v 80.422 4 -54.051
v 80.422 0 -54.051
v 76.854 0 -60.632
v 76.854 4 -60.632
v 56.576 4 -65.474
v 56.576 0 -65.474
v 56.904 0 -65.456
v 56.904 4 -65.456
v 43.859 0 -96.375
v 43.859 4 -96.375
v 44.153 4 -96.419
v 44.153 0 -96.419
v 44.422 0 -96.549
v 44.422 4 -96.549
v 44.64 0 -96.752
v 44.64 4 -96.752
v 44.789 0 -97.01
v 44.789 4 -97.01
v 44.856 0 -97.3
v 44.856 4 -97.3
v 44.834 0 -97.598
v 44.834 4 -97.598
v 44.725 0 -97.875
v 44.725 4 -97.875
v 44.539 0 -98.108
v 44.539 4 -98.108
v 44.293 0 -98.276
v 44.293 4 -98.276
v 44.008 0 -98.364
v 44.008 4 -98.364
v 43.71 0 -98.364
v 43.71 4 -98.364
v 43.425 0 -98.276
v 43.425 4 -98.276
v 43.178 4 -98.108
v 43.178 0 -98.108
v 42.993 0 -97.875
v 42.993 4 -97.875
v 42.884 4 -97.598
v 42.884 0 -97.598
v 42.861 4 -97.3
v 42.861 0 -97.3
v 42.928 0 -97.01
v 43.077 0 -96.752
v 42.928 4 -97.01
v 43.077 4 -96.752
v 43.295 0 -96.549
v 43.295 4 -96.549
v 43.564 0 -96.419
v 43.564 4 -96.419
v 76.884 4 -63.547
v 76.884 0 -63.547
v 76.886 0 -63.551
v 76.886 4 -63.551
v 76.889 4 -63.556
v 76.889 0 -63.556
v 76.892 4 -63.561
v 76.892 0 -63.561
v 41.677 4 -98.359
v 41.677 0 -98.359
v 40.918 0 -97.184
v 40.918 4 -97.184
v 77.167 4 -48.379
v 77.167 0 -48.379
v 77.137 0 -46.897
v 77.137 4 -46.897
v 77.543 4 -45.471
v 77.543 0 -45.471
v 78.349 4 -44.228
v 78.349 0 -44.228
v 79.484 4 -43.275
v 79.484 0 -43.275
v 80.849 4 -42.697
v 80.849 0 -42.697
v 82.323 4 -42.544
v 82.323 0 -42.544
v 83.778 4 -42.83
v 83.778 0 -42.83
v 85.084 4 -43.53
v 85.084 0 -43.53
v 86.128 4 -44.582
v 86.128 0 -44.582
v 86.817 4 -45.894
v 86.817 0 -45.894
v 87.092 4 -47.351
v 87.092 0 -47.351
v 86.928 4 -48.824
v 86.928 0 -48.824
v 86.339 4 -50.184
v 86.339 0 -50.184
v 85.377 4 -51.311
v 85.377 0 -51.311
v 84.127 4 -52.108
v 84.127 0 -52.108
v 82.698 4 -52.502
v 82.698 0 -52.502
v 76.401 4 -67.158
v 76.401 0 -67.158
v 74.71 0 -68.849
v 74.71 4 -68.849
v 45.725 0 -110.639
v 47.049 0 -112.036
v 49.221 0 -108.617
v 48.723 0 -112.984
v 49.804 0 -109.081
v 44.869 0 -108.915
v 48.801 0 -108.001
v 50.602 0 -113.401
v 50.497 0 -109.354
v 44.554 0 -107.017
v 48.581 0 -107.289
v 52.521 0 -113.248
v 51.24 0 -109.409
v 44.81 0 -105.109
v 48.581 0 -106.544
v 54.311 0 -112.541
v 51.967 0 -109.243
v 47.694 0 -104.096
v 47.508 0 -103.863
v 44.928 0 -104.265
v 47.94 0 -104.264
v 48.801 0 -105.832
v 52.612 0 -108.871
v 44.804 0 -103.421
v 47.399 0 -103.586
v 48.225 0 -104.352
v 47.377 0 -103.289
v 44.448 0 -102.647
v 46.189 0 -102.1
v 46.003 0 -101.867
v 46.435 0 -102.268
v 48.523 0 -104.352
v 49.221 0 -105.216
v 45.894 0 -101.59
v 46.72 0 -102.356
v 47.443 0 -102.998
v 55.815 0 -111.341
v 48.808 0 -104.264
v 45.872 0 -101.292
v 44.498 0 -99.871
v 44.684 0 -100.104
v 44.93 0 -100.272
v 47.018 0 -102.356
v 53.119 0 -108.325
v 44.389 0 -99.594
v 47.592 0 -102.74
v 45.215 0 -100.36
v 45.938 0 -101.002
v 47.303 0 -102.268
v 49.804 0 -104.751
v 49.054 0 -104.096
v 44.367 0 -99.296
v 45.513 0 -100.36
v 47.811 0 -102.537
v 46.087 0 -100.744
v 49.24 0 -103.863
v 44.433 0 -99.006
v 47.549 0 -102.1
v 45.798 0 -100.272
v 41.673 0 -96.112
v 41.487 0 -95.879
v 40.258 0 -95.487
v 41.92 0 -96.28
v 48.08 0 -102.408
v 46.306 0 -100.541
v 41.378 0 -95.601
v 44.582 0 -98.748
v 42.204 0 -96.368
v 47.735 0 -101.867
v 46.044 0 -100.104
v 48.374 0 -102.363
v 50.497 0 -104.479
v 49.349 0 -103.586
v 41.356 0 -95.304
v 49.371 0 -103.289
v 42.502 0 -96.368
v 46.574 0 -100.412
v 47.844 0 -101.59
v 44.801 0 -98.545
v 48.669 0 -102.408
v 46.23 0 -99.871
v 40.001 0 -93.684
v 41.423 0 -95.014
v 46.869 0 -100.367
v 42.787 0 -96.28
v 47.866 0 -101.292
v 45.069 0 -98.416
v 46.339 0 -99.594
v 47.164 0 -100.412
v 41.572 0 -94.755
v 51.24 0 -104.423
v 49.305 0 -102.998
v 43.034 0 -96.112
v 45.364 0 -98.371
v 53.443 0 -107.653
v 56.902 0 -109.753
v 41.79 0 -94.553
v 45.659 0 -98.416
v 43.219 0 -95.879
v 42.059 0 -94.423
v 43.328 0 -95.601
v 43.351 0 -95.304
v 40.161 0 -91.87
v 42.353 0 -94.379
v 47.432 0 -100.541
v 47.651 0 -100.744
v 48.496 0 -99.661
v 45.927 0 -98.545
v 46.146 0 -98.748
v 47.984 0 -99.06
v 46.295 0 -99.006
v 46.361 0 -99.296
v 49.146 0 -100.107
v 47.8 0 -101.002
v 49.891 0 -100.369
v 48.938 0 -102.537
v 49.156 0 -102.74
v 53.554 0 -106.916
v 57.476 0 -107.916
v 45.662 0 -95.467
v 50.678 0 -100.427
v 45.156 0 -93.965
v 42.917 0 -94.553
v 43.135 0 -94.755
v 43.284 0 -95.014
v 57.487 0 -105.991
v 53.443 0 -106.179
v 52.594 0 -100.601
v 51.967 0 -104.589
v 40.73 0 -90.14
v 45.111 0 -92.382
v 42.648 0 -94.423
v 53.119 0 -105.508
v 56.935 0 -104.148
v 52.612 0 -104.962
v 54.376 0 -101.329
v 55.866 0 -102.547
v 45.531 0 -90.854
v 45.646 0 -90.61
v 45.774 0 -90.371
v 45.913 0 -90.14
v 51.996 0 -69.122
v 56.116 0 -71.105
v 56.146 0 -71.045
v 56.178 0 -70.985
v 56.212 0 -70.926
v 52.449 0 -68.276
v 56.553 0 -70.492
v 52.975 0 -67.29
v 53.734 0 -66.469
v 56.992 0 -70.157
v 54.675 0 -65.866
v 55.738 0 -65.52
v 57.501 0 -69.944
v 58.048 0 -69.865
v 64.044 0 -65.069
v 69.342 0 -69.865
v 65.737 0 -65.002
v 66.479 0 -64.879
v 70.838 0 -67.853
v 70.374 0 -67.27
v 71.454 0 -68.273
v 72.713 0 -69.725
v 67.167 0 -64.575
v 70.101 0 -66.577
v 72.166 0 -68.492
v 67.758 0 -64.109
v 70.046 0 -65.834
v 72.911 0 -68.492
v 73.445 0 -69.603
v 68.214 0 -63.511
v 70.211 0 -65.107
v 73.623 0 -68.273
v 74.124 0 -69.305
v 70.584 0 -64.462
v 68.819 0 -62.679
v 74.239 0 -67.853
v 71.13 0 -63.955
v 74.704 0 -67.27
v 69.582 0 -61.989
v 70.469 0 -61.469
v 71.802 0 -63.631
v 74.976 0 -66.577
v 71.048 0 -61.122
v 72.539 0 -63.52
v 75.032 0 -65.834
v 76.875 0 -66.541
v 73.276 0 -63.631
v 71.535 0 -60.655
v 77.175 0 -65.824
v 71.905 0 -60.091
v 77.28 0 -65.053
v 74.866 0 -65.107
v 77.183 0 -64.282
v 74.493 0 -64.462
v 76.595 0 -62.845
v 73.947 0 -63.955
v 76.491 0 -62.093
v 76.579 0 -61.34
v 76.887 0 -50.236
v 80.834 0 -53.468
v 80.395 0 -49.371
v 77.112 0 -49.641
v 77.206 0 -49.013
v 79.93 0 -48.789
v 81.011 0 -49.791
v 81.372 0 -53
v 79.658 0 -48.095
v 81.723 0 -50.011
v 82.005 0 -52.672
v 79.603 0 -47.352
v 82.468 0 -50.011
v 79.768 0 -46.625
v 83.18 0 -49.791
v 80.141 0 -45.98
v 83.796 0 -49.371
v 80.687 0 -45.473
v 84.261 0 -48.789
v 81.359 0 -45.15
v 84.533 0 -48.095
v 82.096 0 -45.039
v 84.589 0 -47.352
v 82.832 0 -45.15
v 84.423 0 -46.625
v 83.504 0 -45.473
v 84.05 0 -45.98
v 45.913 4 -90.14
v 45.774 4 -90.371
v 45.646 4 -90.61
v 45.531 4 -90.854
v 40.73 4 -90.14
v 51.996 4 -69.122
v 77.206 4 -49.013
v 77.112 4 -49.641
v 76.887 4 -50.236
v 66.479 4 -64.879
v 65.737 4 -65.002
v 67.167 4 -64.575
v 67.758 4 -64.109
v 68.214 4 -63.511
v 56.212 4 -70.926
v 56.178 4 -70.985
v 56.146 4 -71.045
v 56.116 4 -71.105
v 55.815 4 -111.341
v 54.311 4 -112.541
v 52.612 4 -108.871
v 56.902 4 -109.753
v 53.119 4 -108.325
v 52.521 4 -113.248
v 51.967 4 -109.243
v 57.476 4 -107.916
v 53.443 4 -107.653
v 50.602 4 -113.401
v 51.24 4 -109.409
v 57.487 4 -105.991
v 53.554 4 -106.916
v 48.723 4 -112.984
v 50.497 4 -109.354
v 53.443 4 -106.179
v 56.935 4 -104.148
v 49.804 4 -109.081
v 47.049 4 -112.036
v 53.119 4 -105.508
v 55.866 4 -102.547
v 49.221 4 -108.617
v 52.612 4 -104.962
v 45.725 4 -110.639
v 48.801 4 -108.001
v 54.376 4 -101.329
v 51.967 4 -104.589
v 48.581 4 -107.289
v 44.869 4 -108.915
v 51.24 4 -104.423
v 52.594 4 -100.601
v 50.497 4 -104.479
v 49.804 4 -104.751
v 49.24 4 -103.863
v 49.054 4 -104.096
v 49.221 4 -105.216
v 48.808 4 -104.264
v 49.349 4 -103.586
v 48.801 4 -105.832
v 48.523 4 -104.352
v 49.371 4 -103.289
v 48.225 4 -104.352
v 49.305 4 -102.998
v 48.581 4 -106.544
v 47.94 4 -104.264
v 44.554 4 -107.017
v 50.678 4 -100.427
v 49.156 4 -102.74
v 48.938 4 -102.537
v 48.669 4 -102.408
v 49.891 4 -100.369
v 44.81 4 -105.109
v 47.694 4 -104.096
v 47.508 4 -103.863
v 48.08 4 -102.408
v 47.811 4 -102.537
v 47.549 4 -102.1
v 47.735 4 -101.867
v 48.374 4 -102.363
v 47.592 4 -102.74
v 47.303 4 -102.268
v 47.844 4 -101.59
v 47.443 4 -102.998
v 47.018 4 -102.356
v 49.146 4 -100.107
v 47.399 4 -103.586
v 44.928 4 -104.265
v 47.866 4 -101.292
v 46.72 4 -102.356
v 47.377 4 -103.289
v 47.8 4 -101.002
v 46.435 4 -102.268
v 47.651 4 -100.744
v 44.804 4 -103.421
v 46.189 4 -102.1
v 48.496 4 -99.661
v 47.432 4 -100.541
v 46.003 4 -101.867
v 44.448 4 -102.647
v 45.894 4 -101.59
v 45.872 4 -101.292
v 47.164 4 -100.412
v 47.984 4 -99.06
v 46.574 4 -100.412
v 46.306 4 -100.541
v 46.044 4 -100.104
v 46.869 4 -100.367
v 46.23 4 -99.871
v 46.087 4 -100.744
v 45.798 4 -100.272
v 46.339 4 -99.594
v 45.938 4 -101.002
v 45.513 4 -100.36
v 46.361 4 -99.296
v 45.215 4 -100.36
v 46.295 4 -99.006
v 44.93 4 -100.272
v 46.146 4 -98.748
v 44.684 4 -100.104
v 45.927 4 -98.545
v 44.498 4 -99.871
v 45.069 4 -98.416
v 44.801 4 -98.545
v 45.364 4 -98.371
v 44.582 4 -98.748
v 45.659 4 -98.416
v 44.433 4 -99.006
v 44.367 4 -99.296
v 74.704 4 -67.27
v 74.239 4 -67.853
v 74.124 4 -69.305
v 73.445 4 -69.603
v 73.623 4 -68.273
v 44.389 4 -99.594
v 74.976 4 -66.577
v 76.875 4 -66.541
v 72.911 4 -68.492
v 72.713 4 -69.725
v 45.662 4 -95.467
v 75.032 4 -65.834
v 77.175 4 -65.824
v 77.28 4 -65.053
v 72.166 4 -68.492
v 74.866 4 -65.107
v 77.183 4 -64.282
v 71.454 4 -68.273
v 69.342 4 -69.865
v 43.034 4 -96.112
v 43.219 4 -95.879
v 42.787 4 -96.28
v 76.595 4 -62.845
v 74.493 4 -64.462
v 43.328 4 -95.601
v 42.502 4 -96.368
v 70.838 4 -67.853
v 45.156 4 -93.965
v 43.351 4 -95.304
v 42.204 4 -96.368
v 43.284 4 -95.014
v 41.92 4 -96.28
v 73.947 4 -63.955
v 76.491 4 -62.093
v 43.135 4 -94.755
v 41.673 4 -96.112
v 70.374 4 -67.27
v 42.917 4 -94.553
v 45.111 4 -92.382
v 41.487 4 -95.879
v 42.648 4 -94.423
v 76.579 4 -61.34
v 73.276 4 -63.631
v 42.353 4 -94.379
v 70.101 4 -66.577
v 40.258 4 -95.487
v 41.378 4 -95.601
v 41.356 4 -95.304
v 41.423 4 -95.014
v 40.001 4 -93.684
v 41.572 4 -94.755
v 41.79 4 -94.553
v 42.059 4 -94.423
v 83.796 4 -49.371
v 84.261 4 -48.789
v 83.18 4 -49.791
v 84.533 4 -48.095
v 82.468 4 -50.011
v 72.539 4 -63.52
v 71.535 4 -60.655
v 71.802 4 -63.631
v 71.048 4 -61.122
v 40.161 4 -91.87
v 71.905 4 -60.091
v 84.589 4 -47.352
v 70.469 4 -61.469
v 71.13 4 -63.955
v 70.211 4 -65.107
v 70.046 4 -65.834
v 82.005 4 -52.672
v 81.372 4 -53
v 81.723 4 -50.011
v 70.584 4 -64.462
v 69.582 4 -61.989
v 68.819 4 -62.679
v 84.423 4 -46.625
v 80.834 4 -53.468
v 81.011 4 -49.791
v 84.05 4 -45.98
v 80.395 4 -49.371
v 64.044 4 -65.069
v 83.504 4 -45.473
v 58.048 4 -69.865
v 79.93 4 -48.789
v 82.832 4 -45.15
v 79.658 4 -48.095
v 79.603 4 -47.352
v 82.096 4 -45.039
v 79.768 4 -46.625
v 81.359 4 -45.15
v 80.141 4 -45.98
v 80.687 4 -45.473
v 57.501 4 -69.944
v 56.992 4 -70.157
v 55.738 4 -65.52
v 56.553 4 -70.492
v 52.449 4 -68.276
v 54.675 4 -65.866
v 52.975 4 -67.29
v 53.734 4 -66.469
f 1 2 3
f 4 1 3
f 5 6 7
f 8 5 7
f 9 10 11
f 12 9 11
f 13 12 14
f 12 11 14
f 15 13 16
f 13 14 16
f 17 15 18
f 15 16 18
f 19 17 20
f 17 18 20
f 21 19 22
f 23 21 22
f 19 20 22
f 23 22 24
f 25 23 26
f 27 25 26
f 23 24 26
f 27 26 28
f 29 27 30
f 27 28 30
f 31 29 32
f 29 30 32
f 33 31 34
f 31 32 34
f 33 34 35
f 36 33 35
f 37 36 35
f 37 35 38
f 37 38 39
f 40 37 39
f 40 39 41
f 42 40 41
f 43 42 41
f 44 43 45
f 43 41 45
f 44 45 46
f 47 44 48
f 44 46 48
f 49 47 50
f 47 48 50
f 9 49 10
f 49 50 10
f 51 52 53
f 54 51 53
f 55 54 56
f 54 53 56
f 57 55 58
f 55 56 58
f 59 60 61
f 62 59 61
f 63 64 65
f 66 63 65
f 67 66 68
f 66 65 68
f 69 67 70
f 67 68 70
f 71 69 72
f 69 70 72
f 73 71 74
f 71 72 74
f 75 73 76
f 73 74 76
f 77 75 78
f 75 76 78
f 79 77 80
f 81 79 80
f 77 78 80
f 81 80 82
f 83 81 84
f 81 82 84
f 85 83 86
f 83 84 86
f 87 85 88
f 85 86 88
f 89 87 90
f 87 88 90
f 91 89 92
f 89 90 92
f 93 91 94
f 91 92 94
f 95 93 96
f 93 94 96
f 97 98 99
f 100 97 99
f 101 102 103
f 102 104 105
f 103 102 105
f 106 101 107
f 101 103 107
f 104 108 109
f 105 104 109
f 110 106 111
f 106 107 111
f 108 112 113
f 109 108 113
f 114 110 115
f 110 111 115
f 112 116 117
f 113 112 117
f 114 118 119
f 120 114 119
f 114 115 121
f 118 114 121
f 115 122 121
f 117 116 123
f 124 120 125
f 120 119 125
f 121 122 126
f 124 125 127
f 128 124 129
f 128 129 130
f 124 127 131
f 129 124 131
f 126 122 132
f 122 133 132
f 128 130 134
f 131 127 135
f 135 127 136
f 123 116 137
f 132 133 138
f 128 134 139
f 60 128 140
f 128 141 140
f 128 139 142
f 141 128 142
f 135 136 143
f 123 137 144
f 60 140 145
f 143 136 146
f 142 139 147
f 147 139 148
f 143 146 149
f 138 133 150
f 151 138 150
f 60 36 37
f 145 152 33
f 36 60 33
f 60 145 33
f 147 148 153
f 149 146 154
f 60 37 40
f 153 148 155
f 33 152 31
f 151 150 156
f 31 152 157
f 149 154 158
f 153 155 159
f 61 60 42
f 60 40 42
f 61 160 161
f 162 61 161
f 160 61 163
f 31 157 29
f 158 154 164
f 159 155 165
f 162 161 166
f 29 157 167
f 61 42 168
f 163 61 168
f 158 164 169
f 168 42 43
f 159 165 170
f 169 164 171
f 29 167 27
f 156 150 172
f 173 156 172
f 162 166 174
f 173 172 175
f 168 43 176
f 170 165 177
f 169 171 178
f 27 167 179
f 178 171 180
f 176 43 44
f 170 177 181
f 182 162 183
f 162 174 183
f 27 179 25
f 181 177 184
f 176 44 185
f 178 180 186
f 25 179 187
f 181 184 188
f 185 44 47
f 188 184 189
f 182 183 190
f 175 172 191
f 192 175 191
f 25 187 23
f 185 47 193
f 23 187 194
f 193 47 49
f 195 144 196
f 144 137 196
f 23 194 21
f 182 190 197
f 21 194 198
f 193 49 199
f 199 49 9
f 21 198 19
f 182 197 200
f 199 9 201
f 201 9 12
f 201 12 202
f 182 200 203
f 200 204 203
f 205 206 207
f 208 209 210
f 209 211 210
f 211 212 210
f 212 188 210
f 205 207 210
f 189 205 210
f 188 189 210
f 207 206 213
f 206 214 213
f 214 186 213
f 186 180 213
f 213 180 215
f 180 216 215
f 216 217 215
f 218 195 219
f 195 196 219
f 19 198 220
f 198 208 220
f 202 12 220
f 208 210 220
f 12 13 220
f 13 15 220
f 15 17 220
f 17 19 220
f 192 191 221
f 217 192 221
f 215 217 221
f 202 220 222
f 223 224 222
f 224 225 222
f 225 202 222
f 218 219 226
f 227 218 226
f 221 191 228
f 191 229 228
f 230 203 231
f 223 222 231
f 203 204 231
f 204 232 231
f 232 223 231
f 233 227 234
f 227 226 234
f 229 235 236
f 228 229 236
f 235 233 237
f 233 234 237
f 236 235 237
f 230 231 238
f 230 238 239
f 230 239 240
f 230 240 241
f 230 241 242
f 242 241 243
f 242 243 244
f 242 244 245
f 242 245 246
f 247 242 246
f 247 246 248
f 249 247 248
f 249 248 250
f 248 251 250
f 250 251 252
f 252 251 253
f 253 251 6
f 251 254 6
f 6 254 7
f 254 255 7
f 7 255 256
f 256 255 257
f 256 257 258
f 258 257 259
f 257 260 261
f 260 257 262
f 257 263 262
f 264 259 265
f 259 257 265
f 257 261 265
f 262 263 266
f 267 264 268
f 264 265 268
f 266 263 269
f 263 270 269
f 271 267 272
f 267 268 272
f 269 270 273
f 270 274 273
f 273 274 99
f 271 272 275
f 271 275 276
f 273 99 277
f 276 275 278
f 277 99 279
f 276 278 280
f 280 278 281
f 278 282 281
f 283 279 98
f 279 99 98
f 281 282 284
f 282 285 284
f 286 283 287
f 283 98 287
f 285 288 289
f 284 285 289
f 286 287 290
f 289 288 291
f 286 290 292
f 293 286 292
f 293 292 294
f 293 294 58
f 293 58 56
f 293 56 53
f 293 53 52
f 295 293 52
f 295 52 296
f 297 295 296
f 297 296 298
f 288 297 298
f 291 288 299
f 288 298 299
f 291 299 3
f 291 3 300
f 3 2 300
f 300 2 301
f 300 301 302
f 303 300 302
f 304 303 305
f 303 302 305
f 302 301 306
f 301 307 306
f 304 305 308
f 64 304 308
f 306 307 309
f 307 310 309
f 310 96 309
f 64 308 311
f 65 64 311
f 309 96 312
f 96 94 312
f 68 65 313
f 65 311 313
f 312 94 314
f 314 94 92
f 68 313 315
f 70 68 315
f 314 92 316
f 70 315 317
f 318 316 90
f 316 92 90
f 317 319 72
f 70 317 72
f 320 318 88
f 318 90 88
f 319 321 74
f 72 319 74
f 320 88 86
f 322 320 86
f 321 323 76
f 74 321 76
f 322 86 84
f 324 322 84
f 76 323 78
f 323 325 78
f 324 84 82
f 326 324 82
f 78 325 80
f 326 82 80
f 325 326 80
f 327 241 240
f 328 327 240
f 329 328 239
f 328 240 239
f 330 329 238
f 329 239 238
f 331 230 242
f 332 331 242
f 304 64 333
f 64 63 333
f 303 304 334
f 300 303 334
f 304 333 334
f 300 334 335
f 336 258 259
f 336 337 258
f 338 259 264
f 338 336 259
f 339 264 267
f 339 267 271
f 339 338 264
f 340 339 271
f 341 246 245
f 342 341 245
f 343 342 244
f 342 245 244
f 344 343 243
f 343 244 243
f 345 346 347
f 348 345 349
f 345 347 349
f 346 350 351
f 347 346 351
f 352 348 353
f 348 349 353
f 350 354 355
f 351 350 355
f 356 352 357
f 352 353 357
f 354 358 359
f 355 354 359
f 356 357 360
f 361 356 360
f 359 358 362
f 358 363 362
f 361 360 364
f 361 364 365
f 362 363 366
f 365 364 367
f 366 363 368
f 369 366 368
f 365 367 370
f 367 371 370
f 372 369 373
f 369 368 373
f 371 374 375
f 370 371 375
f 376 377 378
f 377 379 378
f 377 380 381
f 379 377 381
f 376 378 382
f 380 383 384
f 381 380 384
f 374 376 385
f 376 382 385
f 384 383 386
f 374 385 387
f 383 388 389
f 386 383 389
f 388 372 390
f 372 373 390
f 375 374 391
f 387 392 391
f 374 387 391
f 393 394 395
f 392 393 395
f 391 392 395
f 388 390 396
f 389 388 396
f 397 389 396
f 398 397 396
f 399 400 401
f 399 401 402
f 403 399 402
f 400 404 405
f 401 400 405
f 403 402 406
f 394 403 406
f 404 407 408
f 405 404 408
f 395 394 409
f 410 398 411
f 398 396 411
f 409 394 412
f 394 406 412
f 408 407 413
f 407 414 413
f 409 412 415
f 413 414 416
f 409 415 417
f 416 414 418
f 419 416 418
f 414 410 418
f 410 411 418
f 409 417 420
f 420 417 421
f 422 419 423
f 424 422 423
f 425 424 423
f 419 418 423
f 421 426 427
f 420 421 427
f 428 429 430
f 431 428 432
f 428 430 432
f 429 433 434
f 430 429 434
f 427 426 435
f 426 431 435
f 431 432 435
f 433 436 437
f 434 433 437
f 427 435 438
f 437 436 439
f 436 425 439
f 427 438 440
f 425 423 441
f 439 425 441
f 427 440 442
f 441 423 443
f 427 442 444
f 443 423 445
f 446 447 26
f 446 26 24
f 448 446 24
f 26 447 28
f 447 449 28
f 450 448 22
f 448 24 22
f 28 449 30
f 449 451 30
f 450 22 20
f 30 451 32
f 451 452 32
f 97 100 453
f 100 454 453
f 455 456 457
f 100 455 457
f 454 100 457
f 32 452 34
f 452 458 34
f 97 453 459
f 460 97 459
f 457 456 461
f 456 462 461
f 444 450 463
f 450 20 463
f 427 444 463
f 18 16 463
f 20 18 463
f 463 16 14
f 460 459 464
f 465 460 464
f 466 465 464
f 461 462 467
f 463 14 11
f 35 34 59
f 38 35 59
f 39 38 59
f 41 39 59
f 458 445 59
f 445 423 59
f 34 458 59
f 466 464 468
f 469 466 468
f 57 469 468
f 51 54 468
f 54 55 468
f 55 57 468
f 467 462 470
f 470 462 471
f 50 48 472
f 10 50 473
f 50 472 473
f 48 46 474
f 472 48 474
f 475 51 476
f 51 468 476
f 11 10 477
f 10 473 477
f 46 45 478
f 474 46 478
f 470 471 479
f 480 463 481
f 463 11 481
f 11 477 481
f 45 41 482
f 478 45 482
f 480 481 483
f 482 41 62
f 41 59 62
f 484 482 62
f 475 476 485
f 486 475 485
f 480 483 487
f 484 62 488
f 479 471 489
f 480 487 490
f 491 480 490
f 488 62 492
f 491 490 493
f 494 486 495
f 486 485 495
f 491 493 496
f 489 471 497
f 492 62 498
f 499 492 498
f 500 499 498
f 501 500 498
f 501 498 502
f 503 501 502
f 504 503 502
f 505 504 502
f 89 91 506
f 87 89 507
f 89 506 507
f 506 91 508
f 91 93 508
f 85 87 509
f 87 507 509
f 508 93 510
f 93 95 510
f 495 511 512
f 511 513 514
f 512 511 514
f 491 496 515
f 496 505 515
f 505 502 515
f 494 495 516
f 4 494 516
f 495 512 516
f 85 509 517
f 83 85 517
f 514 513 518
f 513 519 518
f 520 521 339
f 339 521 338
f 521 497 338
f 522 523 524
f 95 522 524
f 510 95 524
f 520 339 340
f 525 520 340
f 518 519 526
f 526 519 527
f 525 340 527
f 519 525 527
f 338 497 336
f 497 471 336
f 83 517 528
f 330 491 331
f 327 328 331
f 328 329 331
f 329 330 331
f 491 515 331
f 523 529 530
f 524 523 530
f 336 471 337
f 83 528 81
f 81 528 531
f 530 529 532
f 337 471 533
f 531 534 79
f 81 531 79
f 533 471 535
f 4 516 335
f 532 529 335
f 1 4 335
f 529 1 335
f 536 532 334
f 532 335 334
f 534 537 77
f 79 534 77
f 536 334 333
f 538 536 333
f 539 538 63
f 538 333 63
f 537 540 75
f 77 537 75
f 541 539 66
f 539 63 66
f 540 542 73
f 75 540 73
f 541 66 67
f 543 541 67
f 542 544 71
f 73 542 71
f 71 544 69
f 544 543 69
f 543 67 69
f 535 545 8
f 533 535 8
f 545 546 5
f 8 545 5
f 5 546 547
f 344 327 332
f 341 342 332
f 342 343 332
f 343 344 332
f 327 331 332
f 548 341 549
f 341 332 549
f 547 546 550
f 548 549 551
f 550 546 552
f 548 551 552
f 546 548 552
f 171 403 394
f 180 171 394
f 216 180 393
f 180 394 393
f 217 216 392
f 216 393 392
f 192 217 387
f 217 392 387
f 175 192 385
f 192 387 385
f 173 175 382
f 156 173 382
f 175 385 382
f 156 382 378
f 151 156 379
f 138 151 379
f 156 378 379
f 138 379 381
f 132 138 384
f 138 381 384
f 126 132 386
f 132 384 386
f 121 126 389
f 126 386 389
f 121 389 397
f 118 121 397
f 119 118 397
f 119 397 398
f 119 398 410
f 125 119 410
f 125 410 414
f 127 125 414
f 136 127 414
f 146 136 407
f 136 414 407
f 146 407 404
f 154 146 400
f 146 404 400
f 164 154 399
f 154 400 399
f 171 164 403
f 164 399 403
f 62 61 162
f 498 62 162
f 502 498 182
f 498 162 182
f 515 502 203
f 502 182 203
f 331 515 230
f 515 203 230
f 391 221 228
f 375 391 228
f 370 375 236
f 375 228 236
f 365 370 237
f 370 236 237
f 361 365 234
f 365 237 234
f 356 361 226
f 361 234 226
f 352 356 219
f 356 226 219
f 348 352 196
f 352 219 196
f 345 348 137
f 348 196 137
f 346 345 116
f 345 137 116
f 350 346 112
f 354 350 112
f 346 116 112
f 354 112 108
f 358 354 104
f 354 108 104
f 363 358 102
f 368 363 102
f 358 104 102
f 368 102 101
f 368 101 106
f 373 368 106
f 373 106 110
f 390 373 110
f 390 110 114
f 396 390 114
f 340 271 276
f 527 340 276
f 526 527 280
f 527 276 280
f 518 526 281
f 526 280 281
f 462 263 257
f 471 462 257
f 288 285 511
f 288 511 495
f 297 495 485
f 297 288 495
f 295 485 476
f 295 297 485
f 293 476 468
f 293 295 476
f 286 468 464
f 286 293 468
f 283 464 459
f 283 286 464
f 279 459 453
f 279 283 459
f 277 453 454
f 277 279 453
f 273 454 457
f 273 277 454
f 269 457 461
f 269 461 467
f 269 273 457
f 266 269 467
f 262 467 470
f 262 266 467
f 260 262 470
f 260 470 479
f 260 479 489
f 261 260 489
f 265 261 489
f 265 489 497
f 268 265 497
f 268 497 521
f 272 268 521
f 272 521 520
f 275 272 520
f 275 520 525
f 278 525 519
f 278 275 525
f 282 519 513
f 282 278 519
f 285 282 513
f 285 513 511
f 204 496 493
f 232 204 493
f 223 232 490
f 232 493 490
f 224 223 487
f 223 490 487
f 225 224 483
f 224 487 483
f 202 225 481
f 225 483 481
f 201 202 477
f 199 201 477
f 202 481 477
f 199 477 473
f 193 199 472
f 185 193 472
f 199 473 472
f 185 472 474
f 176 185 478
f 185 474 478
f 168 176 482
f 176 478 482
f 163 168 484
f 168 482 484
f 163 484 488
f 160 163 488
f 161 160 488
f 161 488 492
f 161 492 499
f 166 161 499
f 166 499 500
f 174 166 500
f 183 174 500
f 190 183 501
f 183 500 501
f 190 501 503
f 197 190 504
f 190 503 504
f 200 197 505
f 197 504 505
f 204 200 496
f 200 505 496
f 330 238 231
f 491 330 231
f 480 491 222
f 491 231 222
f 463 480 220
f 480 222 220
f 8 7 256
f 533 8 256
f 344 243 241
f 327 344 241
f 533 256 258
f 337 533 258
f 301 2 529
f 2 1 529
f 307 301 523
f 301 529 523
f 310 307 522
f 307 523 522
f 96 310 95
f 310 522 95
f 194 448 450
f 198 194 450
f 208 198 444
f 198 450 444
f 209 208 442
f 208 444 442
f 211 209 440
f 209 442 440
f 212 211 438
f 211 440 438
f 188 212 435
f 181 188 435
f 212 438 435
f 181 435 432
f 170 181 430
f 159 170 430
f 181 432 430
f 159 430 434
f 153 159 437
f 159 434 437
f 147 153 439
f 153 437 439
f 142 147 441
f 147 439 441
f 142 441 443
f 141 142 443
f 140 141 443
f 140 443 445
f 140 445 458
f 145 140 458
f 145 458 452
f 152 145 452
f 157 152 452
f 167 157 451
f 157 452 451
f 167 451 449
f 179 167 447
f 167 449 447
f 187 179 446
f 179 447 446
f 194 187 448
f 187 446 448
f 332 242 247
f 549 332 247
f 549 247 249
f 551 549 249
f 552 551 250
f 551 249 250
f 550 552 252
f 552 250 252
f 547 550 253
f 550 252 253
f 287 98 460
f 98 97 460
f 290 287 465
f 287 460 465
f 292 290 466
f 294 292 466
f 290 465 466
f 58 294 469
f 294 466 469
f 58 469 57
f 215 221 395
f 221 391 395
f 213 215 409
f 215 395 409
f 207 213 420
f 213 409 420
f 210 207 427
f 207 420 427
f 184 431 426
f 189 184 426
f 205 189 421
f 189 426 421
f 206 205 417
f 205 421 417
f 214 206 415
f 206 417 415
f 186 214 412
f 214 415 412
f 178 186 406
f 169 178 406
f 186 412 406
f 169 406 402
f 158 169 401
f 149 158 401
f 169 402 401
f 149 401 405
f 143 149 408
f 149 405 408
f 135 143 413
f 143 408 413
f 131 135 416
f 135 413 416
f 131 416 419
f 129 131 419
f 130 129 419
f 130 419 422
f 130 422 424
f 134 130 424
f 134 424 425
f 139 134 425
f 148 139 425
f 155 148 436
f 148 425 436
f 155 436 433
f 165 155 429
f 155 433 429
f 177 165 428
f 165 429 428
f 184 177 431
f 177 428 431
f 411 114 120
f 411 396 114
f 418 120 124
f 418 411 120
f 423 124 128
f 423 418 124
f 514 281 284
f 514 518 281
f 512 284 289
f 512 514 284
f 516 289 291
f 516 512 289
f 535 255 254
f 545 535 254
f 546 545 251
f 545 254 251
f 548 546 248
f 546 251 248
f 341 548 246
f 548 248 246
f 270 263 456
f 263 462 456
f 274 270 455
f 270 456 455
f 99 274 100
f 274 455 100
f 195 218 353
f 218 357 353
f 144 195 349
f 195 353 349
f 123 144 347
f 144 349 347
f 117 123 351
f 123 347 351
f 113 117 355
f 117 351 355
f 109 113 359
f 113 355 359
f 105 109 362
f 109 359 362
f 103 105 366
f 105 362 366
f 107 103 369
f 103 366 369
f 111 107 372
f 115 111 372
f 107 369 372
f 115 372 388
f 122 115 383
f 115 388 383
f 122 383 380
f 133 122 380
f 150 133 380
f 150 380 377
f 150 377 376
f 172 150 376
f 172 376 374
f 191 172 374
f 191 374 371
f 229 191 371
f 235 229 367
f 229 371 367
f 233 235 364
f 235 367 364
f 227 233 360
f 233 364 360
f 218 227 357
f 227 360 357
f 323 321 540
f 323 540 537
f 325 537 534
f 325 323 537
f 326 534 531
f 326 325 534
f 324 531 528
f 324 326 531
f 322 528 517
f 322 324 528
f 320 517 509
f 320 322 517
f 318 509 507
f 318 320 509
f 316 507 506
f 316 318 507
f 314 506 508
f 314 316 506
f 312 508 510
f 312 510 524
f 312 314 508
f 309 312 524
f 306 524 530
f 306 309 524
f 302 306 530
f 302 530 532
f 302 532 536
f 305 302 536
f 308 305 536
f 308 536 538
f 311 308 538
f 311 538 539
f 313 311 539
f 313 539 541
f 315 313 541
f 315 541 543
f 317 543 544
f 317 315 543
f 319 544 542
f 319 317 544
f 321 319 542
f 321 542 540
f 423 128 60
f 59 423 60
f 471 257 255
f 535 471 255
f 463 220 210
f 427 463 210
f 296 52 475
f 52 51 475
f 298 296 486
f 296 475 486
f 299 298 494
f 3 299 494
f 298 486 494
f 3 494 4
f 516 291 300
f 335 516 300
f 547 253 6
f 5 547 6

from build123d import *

# Parameters (mm, degrees)
SKETCH2_R           = 2.5
SKETCH2_R_2         = 3.4
BOSS_EXTRUDE1_DEPTH = 4
FILLET1_R           = 3
SKETCH3_R           = 1
CUT_EXTRUDE2_DEPTH  = 4
SKETCH5_W           = 0.9
SKETCH5_H           = 4


with BuildPart() as part:
    # Sketch2 → Boss-Extrude1 (new body)
    with BuildSketch(Plane(origin=(0, 0, 0), x_dir=(1, 0, 0), z_dir=(0, 1, 0))):
        with BuildLine():
            ThreePointArc((49.0624911, 100.728722197), (55.253975507, 111.876765002), (45.278809785, 103.932622106))
            Line((45.278809785, 103.932622106), (41.677103445, 98.359455452))
            Line((41.677103445, 98.359455452), (40.917682236, 97.184351056))
            ThreePointArc((40.917682236, 97.184351056), (40.000914232, 93.684113367), (40.729811239, 90.139986308))
            Line((40.729811239, 90.139986308), (51.995593872, 69.121735128))
            Line((51.995593872, 69.121735128), (52.448751423, 68.276291936))
            ThreePointArc((52.448751423, 68.276291936), (53.733769558, 66.46917356), (55.737555004, 65.519546097))
            Line((55.737555004, 65.519546097), (56.575581952, 65.474059755))
            Line((56.575581952, 65.474059755), (56.904280571, 65.456218685))
            Line((56.904280571, 65.456218685), (64.043852088, 65.068697747))
            Line((64.043852088, 65.068697747), (67.659658755, 64.927019071))
            ThreePointArc((67.659658755, 64.927019071), (68.973857559, 62.514332624), (71.364365032, 61.16020988))
            Line((71.364365032, 61.16020988), (77.3922419, 49.235496946))
            ThreePointArc((77.3922419, 49.235496946), (85.295038859, 43.696471142), (81.278467798, 52.471558808))
            Line((81.278467798, 52.471558808), (75.926202221, 62.342787356))
            ThreePointArc((75.926202221, 62.342787356), (77.117833046, 64.012589982), (77.538655529, 66.020358214))
            Line((77.538655529, 66.020358214), (73.882441794, 69.676571949))
            Line((73.882441794, 69.676571949), (69.341583584, 69.864669723))
            Line((69.341583584, 69.864669723), (65.404712603, 69.864669723))
            Line((65.404712603, 69.864669723), (58.04793187, 69.864669723))
            ThreePointArc((58.04793187, 69.864669723), (56.992330015, 70.157110244), (56.212176606, 70.925990854))
            ThreePointArc((56.212176606, 70.925990854), (56.161986001, 71.014595828), (56.115987655, 71.105447853))
            Line((56.115987655, 71.105447853), (45.913475043, 90.139986308))
            ThreePointArc((45.913475043, 90.139986308), (45.708651409, 90.489699119), (45.530826332, 90.853883157))
            ThreePointArc((45.530826332, 90.853883157), (45.074746145, 93.175228741), (45.661998303, 95.466907026))
            Line((45.661998303, 95.466907026), (49.0624911, 100.728722197))
        make_face()
        with Locations(Location((82.095552315, 47.538773298, 0), (0, 0, 270))):
            Circle(SKETCH2_R, mode=Mode.SUBTRACT)
        with Locations(Location((72.538655529, 66.020358214, 0), (0, 0, 270))):
            Circle(SKETCH2_R, mode=Mode.SUBTRACT)
        with Locations(Location((51.053576092, 106.916256485, 0), (0, 0, 270))):
            Circle(SKETCH2_R_2, mode=Mode.SUBTRACT)
    extrude(amount=BOSS_EXTRUDE1_DEPTH)

    # Fillet1
    fillet1_edges = [part.edges().sort_by_distance(p)[0] for p in [
        (71.364365032, 2, -61.16020988),
        (67.659658755, 2, -64.927019071),
        (45.278809785, 2, -103.932622106),
        (49.0624911, 2, -100.728722197),
        (73.882441794, 2, -69.676571949),
        (77.538655529, 2, -66.020358214),
        (75.926202221, 2, -62.342787356),
        (81.278467798, 2, -52.471558808),
        (77.3922419, 2, -49.235496946),
    ]]
    fillet(fillet1_edges, radius=FILLET1_R)

    # Sketch3 → Cut-Extrude2 (cut)
    with BuildSketch(Plane(origin=(0, 4, 0), x_dir=(1, 0, 0), z_dir=(0, 1, 0))):
        with Locations(Location((48.374282672, 103.36324554, 0), (0, 0, 270))):
            Circle(SKETCH3_R)
        with Locations(Location((46.86906165, 101.367171976, 0), (0, 0, 270))):
            Circle(SKETCH3_R)
        with Locations(Location((45.363840628, 99.371098411, 0), (0, 0, 270))):
            Circle(SKETCH3_R)
        with Locations(Location((43.858619606, 97.375024847, 0), (0, 0, 270))):
            Circle(SKETCH3_R)
        with Locations(Location((42.353398584, 95.378951282, 0), (0, 0, 270))):
            Circle(SKETCH3_R)
    extrude(amount=-CUT_EXTRUDE2_DEPTH, mode=Mode.SUBTRACT)

    # Sweep1: sweep along a path in Sketch4
    with BuildLine(Plane(origin=(0, 4, 0), x_dir=(1, 0, 0), z_dir=(0, 1, 0))) as sweep1_path:
        CenterArc((51.053576092, 106.916256485), 3.4, 0, 360)
    # Sketch5 → Sweep1 (sweep)
    with BuildSketch(Plane(origin=(45.965783702, 0, -109.06060876), x_dir=(0.9214977377283068, 0, 0.38838372695262713), z_dir=(-0.38838372695262713, 0, 0.9214977377283068))):
        with Locations((2.571220706, 2)):
            Rectangle(SKETCH5_W, SKETCH5_H)
    sweep(path=sweep1_path.line)


solid = part.part
